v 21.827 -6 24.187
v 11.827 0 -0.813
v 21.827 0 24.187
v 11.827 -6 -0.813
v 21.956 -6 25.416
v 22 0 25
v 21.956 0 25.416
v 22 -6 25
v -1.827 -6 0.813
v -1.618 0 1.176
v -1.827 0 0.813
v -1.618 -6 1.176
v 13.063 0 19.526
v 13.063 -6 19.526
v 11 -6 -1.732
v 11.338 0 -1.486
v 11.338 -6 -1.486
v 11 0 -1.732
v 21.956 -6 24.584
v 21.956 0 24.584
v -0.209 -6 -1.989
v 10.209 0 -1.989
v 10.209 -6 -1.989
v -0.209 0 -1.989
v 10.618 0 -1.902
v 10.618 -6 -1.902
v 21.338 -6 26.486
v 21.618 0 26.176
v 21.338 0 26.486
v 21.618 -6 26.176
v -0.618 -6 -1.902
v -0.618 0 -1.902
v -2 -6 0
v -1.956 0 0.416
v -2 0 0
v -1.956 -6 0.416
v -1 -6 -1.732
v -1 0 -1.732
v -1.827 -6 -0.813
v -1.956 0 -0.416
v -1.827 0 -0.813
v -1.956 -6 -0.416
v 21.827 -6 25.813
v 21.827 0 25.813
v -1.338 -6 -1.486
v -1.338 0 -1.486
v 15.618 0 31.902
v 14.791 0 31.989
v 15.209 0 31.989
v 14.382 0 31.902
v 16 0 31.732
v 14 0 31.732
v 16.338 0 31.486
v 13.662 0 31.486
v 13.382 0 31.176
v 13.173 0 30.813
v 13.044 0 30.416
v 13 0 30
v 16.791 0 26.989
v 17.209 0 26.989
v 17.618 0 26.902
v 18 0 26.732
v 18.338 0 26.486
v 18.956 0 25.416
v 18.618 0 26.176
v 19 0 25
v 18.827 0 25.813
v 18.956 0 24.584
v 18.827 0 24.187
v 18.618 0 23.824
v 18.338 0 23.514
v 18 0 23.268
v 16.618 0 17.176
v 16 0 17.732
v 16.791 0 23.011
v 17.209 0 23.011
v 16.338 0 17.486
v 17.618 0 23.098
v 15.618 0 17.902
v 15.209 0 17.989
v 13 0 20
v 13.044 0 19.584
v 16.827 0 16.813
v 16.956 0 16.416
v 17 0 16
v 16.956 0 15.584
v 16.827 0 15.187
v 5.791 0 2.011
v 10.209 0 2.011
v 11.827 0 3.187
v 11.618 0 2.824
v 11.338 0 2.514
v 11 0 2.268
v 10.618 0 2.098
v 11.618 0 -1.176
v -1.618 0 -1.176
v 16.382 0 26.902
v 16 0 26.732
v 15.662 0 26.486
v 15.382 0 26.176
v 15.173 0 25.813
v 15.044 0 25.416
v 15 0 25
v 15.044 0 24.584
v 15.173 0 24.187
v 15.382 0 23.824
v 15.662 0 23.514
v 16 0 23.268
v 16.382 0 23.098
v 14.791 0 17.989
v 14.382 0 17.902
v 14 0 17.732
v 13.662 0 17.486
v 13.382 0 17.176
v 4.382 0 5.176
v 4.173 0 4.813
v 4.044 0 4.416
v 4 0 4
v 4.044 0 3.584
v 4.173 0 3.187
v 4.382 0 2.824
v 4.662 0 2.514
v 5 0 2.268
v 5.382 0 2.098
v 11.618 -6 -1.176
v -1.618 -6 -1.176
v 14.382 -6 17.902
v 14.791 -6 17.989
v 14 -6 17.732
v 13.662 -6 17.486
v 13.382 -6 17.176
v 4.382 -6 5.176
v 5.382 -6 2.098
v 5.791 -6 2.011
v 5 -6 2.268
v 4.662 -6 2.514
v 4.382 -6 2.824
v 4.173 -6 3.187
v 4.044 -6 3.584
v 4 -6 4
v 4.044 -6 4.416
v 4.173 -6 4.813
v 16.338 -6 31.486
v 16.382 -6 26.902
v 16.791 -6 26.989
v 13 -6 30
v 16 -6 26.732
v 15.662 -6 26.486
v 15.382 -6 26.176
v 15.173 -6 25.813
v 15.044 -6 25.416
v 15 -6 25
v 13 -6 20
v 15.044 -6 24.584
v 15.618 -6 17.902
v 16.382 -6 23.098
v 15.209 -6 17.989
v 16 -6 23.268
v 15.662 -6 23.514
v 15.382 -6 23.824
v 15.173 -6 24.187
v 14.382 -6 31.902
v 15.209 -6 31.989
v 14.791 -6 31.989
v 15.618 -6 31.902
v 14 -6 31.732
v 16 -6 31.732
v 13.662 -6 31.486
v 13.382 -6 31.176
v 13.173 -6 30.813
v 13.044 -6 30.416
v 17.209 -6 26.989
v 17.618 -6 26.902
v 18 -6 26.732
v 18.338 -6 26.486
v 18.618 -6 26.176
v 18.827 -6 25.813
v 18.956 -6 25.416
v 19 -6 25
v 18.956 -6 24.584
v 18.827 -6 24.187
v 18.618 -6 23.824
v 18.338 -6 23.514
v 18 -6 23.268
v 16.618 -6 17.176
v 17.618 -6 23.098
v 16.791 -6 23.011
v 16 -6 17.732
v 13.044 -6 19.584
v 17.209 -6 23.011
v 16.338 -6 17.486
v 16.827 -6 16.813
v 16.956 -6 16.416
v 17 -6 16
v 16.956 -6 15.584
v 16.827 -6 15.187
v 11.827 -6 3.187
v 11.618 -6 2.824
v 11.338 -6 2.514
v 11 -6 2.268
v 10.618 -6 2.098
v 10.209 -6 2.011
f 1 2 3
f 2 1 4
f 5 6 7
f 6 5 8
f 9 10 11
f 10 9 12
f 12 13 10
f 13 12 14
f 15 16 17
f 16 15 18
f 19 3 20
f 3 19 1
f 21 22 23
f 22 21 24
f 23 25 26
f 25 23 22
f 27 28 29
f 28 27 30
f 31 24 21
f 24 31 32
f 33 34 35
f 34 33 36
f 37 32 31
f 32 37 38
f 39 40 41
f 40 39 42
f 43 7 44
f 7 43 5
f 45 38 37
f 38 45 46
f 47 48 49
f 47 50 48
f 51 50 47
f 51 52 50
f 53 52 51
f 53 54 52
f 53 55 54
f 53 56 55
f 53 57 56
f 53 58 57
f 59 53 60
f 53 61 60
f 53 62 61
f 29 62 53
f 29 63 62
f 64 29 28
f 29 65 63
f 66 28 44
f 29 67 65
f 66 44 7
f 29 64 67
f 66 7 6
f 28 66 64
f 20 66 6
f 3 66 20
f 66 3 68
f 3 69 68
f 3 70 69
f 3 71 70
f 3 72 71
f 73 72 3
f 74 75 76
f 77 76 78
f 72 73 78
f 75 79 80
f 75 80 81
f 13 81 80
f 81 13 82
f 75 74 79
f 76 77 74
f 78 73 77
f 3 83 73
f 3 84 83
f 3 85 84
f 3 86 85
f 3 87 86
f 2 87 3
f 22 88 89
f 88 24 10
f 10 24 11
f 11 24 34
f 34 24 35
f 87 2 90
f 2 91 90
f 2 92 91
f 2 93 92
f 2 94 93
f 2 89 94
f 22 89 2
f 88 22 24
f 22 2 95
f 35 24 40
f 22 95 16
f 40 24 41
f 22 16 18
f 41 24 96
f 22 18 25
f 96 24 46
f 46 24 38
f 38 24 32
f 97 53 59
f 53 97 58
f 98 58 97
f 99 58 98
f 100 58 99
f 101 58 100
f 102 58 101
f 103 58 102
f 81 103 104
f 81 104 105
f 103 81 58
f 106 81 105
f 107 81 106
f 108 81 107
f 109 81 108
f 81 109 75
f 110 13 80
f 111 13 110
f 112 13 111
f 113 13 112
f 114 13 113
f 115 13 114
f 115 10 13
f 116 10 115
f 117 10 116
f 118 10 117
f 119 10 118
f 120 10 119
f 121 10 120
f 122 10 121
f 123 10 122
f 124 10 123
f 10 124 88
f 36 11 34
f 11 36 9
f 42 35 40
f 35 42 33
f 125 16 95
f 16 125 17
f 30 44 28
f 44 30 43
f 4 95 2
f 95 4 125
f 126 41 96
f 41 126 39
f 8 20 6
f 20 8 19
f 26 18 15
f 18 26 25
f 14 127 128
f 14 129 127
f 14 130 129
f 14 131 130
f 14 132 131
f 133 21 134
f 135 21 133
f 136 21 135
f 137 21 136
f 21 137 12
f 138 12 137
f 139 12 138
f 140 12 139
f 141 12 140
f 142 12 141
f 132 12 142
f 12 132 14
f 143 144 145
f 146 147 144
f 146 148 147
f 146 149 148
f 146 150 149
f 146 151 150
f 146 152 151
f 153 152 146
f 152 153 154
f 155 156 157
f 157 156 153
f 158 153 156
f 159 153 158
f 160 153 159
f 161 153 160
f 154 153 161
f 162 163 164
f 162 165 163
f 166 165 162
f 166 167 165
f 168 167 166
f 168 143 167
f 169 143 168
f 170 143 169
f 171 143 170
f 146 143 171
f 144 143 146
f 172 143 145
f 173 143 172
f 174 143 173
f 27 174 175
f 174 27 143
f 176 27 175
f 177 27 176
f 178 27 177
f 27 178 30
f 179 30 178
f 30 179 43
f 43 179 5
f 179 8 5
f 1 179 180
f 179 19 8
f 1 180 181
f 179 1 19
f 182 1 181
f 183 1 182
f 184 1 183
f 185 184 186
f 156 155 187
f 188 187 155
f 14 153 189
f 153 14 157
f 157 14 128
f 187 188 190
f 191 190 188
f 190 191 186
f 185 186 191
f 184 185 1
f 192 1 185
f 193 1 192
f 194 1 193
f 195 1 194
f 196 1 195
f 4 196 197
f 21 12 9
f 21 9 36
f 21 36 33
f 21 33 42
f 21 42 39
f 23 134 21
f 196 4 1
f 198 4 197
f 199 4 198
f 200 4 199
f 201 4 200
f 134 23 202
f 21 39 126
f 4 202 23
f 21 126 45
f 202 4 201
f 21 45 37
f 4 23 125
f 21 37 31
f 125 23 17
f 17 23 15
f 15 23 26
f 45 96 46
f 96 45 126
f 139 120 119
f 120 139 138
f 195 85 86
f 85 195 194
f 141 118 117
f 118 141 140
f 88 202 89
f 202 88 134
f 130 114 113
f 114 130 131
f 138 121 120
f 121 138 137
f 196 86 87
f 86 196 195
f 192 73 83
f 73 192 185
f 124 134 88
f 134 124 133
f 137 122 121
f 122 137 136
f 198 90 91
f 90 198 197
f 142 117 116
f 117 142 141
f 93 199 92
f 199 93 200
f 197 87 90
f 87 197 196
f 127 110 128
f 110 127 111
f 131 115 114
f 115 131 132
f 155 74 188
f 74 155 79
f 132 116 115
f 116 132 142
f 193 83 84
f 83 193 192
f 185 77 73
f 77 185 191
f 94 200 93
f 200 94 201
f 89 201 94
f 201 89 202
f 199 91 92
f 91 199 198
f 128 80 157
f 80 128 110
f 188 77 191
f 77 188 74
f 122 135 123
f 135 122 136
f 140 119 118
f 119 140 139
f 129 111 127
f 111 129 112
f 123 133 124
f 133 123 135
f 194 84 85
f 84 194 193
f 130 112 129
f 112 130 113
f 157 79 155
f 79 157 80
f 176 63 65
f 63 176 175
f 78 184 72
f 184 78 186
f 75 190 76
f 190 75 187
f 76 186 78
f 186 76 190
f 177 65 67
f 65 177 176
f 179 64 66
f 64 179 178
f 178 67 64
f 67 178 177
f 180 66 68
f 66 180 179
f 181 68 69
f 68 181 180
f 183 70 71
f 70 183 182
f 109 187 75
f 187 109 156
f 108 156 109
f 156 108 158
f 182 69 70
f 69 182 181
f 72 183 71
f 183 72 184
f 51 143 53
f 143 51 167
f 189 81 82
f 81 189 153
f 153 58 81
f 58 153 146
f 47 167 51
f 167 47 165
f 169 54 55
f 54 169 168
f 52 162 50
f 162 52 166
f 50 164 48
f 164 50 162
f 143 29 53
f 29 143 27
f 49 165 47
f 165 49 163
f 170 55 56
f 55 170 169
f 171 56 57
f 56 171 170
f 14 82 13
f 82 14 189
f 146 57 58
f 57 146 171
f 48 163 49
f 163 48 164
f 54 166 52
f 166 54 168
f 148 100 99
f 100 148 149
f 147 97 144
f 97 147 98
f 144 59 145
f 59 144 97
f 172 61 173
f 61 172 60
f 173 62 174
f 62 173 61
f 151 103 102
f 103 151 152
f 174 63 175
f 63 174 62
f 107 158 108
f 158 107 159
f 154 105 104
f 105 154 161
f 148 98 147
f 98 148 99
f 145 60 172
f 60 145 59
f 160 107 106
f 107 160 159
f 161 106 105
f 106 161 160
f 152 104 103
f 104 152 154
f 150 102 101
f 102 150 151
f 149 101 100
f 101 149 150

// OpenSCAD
// file: ../../utils.scad
// Cube with rounded corners
// roundedCornerCube (50,50,4);
module roundedCornerCube(length, width, thickness){

        hull()
        {
            translate([length/2, width/2, 0]) cylinder(r=2, h=thickness, $fn=50, center=true);
            translate([length/2, -width/2, 0]) cylinder(r=2, h=thickness, $fn=50, center=true);
            translate([-length/2, width/2, 0]) cylinder(r=2, h=thickness, $fn=50, center=true);
            translate([-length/2, -width/2, 0]) cylinder(r=2, h=thickness, $fn=50, center=true);
        }

}

// Hollow cube with rounded corners. Will look like a frame with rounded con
// hollowRoundedCornerCube(50,70,4,2);
module hollowRoundedCornerCube(length, width, thickness, wallthickness)
{
    difference()
    {
        roundedCornerCube(length,width,thickness);
        roundedCornerCube(length-(wallthickness*2),width-(wallthickness*2),thickness);
    }
}

/*
module cylinderWithHandle(radius, thickness)
{
    rotate_extrude($fn=100)
        polygon( points = [[0,0], [radius,0], [radius,thickness] , [1,thickness], [2,thickness + 2] , [2,thickness + 6],[0,thickness + 6]] );
}
*/


// hollow cylinder
// hollowCylinder(radius, height, wallThickness)
// radius : radius to outter wall
// wallThickness : Thickness of wall
module hollowCylinder(radius, height, wallThickness)
{

    difference()
    {
        cylinder(h=height, r1=radius, r2=radius);
        cylinder(h=height, r1=radius - wallThickness, r2=radius - wallThickness);
    }
}


// hollow cylinders
// hollowCylinders(20, 10, 2, 2, 2)
// radius : radius to outer wall
// gapsSize : size of gap between each rings
// minradius : radius of the smallest ring
module hollowCylinders(radius, height, wallThickness, gapSize, minRadius)
{
    for (i = [radius : -(gapSize + wallThickness) : minRadius])
    {
       //echo (i);
       hollowCylinder(i,height,wallThickness);
    }
}

//
// b = bottom diameter
// t = top diameter
// h = height
module cone(b, t, h)
{
    cylinder(h=h, r1=b/2, r2=t/2, $fn=100);
}

// hollowCone(10,4,20, 2)
module hollowCone(bottomRadius, topRadius, height, wallThickness)
{
    difference()
    {
        cylinder(h=height, r1=bottomRadius, r2=topRadius, $fn=100);
        cylinder(h=height, r1=bottomRadius - wallThickness, r2=topRadius - wallThickness, $fn=100);
    }
}


// w = width between flat surface
// h = height
module hex (w=10, h=2){
  cylinder (r=w/2, h=h, center=true, $fn=6);
}

// hollowCone(10,4,20, 2)
module hollowHex(w=10, h=2, th=2)
{
    difference()
    {
        cylinder (r=w/2, h=h, center=true, $fn=6);
        cylinder (r=w/2 - th, h=h, center=true, $fn=6);
    }
}


///////////////////////////////////////////////////////////////////////////////////////////////////////////////////

// honeycomb tiles
// honeycombSquare(100,100,4,10,2);
module honeycombTiles(length, width,thickness,rad,wallThickness)
{
    //thickness = 4;
    //rad = 10;
    //wallThickness = 2;
    //length = 100;
    //width = 100;

    for (w=[0: width/rad])
    {

        if (w % 2 == 0)
        {
            //cylinder($fn=6, r=rad, h=2);
            for (i = [0 : length/((rad*2) + (wallThickness*2))])
            {
              translate([rad*(3*i) + (wallThickness*2)*i,w*rad,0]) cylinder($fn=6, r=rad, h=thickness);

              //translate([rad*6 + (wallThickness*2)*2,0,0]) cylinder($fn=6, r=10, h=2);
              //translate([rad*9 + (wallThickness*2)*3,0,0]) cylinder($fn=6, r=10, h=2);
            }
        }

        if (w % 2 == 1)
        {
            for (j = [1 : 2 : (length/(rad + wallThickness))])
            {
              translate([(rad*1.5) *j + wallThickness *j , (w*rad) + wallThickness/2 ,0])  cylinder($fn=6, r=rad, h=thickness);
                //translate([(rad*1.5) *3 + wallThickness *3 ,10,0]) circle($fn=6, r=10);
                //translate([(rad*1.5) *5 + wallThickness *5 ,10,0]) circle($fn=6, r=10);
            }
        }
    }
}

// honeycomb square
// A square area with hollow honeycomb design
// honeycombSquare(100,100,4,10,2);
module honeycombSquare(length, width, thickness, cellRad,wallThickness)
{
    difference()
    {
        cube([length,width,thickness], center=true);
        translate([-length/2,-width/2, -thickness/2]) honeycombTiles(length,width,thickness,cellRad,wallThickness);
    }
}

//honeycomb(length, width, height, cell_size, wall_thickness);
//honeycomb(50, 50, 4, 10, 1);
//hollowRoundedCornerCube(50,70,4,2);

//hollowCylinder(10,20,2);

//hollowCylinders(20, 10, 2, 2, 2);
//cone(10,2,20);

// hollowCone(10,4,20, 2);

// honeycombSquare(40,40,2,5,2);


module edgeClamp(l=10)
{
   difference()
   {
    translate([0,.6,0]) rotate([45,0,0]) cube([l,2,2], center=true);
    translate([0,.6,1.5]) cube([l,1,1], center=true);
    translate([0,.6,-1.5]) cube([l,1,1], center=true);
   }
   cube([l,2,2], center=true);
}

cube([10,2,2], center=true);
translate([0,0,2]) edgeClamp();
// file: ../../lib/utils.scad
// Cube with rounded corners
// roundedCornerCube (50,50,4);
module roundedCornerCube(length, width, thickness){

        hull()
        {
            translate([length/2 - 2, width/2 - 2, 0]) cylinder(r=2, h=thickness, $fn=50, center=true);
            translate([length/2 - 2, -width/2 + 2, 0]) cylinder(r=2, h=thickness, $fn=50, center=true);
            translate([-length/2 + 2, width/2 - 2, 0]) cylinder(r=2, h=thickness, $fn=50, center=true);
            translate([-length/2 + 2, -width/2 + 2, 0]) cylinder(r=2, h=thickness, $fn=50, center=true);
        }

}

// Hollow cube with rounded corners. Will look like a frame with rounded con
// hollowRoundedCornerCube(50,70,4,2);
module hollowRoundedCornerCube(length, width, thickness, wallthickness)
{
    difference()
    {
        roundedCornerCube(length,width,thickness);
        roundedCornerCube(length-(wallthickness*2),width-(wallthickness*2),thickness);
    }
}

/*
module cylinderWithHandle(radius, thickness)
{
    rotate_extrude($fn=100)
        polygon( points = [[0,0], [radius,0], [radius,thickness] , [1,thickness], [2,thickness + 2] , [2,thickness + 6],[0,thickness + 6]] );
}
*/


// hollow cylinder
// hollowCylinder(radius, height, wallThickness)
// radius : radius to outter wall
// wallThickness : Thickness of wall
module hollowCylinder(radius, height, wallThickness)
{

    difference()
    {
        cylinder(h=height, r1=radius, r2=radius);
        cylinder(h=height, r1=radius - wallThickness, r2=radius - wallThickness);
    }
}


// hollow cylinders
// hollowCylinders(20, 10, 2, 2, 2)
// radius : radius to outer wall
// gapsSize : size of gap between each rings
// minradius : radius of the smallest ring
module hollowCylinders(radius, height, wallThickness, gapSize, minRadius)
{
    for (i = [radius : -(gapSize + wallThickness) : minRadius])
    {
       //echo (i);
       hollowCylinder(i,height,wallThickness);
    }
}

//
// b = bottom diameter
// t = top diameter
// h = height
module cone(b, t, h)
{
    cylinder(h=h, r1=b/2, r2=t/2, $fn=100);
}

// hollowCone(10,4,20, 2)
module hollowCone(bottomRadius, topRadius, height, wallThickness)
{
    difference()
    {
        cylinder(h=height, r1=bottomRadius, r2=topRadius, $fn=100);
        cylinder(h=height, r1=bottomRadius - wallThickness, r2=topRadius - wallThickness, $fn=100);
    }
}


// w = width between flat surface
// h = height
module hex (w=10, h=2){
  cylinder (r=w/2, h=h, center=true, $fn=6);
}

// hollowCone(10,4,20, 2)
module hollowHex(w=10, h=2, th=2)
{
    difference()
    {
        cylinder (r=w/2, h=h, center=true, $fn=6);
        cylinder (r=w/2 - th, h=h, center=true, $fn=6);
    }
}

// h : height
// ns : number of sides for base
// br : bottom radius
// tr : top radius
// ro : rotation in degree between bottom and top
// sl : slice layer. high value give smooth appearence
module twistExtrude(h=50,ns=6,br=20,tr=20,ro=100,sl=5)
{

	linear_extrude(height = h, twist  = ro,	slices = sl, scale  = tr/br)
		circle(r=br, $fn=ns);
}


// h : height
// ns : number of sides for base
// br : bottom radius
// tr : top radius
// ro : rotation in degree between bottom and top
// sl : slice layer. high value give smooth appearence
// wt : wall thickness
module hollowTwistExtrude(h=50,ns=6,br=20,tr=20,ro=100,sl=5,wt=1)
{
	difference()
	{
		linear_extrude(height = h, twist  = ro,	slices = sl, scale  = tr/br)
			circle(r=br, $fn=ns);

    translate([0,0,-.01])
		linear_extrude(height = h + .1, twist  = ro,	slices = sl, scale  = tr/br)
			circle(r=br - wt, $fn=ns);
	}
}


///////////////////////////////////////////////////////////////////////////////////////////////////////////////////

// honeycomb tiles
// honeycombSquare(100,100,4,10,2);
module honeycombTiles(length, width,thickness,rad,wallThickness)
{
    //thickness = 4;
    //rad = 10;
    //wallThickness = 2;
    //length = 100;
    //width = 100;

    for (w=[0: width/rad])
    {

        if (w % 2 == 0)
        {
            //cylinder($fn=6, r=rad, h=2);
            for (i = [0 : length/((rad*2) + (wallThickness*2))])
            {
              translate([rad*(3*i) + (wallThickness*2)*i,w*rad,0]) cylinder($fn=6, r=rad, h=thickness);

              //translate([rad*6 + (wallThickness*2)*2,0,0]) cylinder($fn=6, r=10, h=2);
              //translate([rad*9 + (wallThickness*2)*3,0,0]) cylinder($fn=6, r=10, h=2);
            }
        }

        if (w % 2 == 1)
        {
            for (j = [1 : 2 : (length/(rad + wallThickness))])
            {
              translate([(rad*1.5) *j + wallThickness *j , (w*rad) + wallThickness/2 ,0])  cylinder($fn=6, r=rad, h=thickness);
                //translate([(rad*1.5) *3 + wallThickness *3 ,10,0]) circle($fn=6, r=10);
                //translate([(rad*1.5) *5 + wallThickness *5 ,10,0]) circle($fn=6, r=10);
            }
        }
    }
}

// honeycomb square
// A square area with hollow honeycomb design
// honeycombSquare(100,100,4,10,2);
module honeycombSquare(length, width, thickness, cellRad,wallThickness)
{
    difference()
    {
        cube([length,width,thickness], center=true);
        translate([-length/2,-width/2, -thickness/2]) honeycombTiles(length,width,thickness,cellRad,wallThickness);
    }
}

//honeycomb(length, width, height, cell_size, wall_thickness);
//honeycomb(50, 50, 4, 10, 1);
//hollowRoundedCornerCube(50,70,4,2);

//hollowCylinder(10,20,2);

//hollowCylinders(20, 10, 2, 2, 2);
//cone(10,2,20);

// hollowCone(10,4,20, 2);

// honeycombSquare(40,40,2,5,2);


module edgeClamp(l=10)
{
   difference()
   {
    translate([0,.6,0]) rotate([45,0,0]) cube([l,2,2], center=true);
    translate([0,.6,1.5]) cube([l + .1,1,1], center=true);
    translate([0,.6,-1.5]) cube([l + .1,1,1], center=true);
   }
   cube([l,2,2], center=true);
}

cube([10,2,2], center=true);
translate([0,0,2]) edgeClamp();
// main file
use <../../lib/utils.scad>
use <../../3rdParty/threads.scad>


module base(l=bl, w=bw,t=bt)
{
  cube([l,w,t], center=true);
}

module landingSkid(td=0)
{
  // leg
  difference()
  {
    hull()
    {
      rotate([90,0,0]) cylinder(r=2, h=6, $fn=30);
      translate([10,0,0]) rotate([90,0,0]) cylinder(r=2, h=6, $fn=30);
      translate([20,0,25]) rotate([90,0,0]) cylinder(r=2, h=6, $fn=30);
    }

    //Make it hollow
    hull()
    {
      translate([6,.1,4]) rotate([90,0,0]) cylinder(r=2, h=7, $fn=30);
      translate([10,.1,4]) rotate([90,0,0]) cylinder(r=2, h=7, $fn=30);
      translate([15,.1,16]) rotate([90,0,0]) cylinder(r=2, h=7, $fn=30);
    }

    translate([17,.1,25]) rotate([90,0,0]) cylinder(r=2, h=7, $fn=30);

    // M3 threaded holes
    if( td==1)
    {
      translate([2,-3,-2]) threaded_hole(d=3.1,t=5);
      translate([8,-3,-2]) threaded_hole(d=3,t=5);
    }
  }


  // feet
  difference()
  {
    hull()
    {
      translate([20,0,25]) rotate([90,0,0]) cylinder(r=2, h=6, $fn=30);
      translate([15,0,30]) rotate([90,0,0]) cylinder(r=2, h=6, $fn=30);
      translate([15,0,20]) rotate([90,0,0]) cylinder(r=2, h=6, $fn=30);
    }

    translate([17,.1,25]) rotate([90,0,0]) cylinder(r=2, h=7, $fn=30);
  }
}

module threaded_hole(d=3,t=4)
{
  translate([0,0,-0.1])	cylinder(r = d/2, h=t + 0.2, $fn=30);
  thread_in_pitch(dia=d,hi=t,p=.5,thr=30);
}

landingSkid();
